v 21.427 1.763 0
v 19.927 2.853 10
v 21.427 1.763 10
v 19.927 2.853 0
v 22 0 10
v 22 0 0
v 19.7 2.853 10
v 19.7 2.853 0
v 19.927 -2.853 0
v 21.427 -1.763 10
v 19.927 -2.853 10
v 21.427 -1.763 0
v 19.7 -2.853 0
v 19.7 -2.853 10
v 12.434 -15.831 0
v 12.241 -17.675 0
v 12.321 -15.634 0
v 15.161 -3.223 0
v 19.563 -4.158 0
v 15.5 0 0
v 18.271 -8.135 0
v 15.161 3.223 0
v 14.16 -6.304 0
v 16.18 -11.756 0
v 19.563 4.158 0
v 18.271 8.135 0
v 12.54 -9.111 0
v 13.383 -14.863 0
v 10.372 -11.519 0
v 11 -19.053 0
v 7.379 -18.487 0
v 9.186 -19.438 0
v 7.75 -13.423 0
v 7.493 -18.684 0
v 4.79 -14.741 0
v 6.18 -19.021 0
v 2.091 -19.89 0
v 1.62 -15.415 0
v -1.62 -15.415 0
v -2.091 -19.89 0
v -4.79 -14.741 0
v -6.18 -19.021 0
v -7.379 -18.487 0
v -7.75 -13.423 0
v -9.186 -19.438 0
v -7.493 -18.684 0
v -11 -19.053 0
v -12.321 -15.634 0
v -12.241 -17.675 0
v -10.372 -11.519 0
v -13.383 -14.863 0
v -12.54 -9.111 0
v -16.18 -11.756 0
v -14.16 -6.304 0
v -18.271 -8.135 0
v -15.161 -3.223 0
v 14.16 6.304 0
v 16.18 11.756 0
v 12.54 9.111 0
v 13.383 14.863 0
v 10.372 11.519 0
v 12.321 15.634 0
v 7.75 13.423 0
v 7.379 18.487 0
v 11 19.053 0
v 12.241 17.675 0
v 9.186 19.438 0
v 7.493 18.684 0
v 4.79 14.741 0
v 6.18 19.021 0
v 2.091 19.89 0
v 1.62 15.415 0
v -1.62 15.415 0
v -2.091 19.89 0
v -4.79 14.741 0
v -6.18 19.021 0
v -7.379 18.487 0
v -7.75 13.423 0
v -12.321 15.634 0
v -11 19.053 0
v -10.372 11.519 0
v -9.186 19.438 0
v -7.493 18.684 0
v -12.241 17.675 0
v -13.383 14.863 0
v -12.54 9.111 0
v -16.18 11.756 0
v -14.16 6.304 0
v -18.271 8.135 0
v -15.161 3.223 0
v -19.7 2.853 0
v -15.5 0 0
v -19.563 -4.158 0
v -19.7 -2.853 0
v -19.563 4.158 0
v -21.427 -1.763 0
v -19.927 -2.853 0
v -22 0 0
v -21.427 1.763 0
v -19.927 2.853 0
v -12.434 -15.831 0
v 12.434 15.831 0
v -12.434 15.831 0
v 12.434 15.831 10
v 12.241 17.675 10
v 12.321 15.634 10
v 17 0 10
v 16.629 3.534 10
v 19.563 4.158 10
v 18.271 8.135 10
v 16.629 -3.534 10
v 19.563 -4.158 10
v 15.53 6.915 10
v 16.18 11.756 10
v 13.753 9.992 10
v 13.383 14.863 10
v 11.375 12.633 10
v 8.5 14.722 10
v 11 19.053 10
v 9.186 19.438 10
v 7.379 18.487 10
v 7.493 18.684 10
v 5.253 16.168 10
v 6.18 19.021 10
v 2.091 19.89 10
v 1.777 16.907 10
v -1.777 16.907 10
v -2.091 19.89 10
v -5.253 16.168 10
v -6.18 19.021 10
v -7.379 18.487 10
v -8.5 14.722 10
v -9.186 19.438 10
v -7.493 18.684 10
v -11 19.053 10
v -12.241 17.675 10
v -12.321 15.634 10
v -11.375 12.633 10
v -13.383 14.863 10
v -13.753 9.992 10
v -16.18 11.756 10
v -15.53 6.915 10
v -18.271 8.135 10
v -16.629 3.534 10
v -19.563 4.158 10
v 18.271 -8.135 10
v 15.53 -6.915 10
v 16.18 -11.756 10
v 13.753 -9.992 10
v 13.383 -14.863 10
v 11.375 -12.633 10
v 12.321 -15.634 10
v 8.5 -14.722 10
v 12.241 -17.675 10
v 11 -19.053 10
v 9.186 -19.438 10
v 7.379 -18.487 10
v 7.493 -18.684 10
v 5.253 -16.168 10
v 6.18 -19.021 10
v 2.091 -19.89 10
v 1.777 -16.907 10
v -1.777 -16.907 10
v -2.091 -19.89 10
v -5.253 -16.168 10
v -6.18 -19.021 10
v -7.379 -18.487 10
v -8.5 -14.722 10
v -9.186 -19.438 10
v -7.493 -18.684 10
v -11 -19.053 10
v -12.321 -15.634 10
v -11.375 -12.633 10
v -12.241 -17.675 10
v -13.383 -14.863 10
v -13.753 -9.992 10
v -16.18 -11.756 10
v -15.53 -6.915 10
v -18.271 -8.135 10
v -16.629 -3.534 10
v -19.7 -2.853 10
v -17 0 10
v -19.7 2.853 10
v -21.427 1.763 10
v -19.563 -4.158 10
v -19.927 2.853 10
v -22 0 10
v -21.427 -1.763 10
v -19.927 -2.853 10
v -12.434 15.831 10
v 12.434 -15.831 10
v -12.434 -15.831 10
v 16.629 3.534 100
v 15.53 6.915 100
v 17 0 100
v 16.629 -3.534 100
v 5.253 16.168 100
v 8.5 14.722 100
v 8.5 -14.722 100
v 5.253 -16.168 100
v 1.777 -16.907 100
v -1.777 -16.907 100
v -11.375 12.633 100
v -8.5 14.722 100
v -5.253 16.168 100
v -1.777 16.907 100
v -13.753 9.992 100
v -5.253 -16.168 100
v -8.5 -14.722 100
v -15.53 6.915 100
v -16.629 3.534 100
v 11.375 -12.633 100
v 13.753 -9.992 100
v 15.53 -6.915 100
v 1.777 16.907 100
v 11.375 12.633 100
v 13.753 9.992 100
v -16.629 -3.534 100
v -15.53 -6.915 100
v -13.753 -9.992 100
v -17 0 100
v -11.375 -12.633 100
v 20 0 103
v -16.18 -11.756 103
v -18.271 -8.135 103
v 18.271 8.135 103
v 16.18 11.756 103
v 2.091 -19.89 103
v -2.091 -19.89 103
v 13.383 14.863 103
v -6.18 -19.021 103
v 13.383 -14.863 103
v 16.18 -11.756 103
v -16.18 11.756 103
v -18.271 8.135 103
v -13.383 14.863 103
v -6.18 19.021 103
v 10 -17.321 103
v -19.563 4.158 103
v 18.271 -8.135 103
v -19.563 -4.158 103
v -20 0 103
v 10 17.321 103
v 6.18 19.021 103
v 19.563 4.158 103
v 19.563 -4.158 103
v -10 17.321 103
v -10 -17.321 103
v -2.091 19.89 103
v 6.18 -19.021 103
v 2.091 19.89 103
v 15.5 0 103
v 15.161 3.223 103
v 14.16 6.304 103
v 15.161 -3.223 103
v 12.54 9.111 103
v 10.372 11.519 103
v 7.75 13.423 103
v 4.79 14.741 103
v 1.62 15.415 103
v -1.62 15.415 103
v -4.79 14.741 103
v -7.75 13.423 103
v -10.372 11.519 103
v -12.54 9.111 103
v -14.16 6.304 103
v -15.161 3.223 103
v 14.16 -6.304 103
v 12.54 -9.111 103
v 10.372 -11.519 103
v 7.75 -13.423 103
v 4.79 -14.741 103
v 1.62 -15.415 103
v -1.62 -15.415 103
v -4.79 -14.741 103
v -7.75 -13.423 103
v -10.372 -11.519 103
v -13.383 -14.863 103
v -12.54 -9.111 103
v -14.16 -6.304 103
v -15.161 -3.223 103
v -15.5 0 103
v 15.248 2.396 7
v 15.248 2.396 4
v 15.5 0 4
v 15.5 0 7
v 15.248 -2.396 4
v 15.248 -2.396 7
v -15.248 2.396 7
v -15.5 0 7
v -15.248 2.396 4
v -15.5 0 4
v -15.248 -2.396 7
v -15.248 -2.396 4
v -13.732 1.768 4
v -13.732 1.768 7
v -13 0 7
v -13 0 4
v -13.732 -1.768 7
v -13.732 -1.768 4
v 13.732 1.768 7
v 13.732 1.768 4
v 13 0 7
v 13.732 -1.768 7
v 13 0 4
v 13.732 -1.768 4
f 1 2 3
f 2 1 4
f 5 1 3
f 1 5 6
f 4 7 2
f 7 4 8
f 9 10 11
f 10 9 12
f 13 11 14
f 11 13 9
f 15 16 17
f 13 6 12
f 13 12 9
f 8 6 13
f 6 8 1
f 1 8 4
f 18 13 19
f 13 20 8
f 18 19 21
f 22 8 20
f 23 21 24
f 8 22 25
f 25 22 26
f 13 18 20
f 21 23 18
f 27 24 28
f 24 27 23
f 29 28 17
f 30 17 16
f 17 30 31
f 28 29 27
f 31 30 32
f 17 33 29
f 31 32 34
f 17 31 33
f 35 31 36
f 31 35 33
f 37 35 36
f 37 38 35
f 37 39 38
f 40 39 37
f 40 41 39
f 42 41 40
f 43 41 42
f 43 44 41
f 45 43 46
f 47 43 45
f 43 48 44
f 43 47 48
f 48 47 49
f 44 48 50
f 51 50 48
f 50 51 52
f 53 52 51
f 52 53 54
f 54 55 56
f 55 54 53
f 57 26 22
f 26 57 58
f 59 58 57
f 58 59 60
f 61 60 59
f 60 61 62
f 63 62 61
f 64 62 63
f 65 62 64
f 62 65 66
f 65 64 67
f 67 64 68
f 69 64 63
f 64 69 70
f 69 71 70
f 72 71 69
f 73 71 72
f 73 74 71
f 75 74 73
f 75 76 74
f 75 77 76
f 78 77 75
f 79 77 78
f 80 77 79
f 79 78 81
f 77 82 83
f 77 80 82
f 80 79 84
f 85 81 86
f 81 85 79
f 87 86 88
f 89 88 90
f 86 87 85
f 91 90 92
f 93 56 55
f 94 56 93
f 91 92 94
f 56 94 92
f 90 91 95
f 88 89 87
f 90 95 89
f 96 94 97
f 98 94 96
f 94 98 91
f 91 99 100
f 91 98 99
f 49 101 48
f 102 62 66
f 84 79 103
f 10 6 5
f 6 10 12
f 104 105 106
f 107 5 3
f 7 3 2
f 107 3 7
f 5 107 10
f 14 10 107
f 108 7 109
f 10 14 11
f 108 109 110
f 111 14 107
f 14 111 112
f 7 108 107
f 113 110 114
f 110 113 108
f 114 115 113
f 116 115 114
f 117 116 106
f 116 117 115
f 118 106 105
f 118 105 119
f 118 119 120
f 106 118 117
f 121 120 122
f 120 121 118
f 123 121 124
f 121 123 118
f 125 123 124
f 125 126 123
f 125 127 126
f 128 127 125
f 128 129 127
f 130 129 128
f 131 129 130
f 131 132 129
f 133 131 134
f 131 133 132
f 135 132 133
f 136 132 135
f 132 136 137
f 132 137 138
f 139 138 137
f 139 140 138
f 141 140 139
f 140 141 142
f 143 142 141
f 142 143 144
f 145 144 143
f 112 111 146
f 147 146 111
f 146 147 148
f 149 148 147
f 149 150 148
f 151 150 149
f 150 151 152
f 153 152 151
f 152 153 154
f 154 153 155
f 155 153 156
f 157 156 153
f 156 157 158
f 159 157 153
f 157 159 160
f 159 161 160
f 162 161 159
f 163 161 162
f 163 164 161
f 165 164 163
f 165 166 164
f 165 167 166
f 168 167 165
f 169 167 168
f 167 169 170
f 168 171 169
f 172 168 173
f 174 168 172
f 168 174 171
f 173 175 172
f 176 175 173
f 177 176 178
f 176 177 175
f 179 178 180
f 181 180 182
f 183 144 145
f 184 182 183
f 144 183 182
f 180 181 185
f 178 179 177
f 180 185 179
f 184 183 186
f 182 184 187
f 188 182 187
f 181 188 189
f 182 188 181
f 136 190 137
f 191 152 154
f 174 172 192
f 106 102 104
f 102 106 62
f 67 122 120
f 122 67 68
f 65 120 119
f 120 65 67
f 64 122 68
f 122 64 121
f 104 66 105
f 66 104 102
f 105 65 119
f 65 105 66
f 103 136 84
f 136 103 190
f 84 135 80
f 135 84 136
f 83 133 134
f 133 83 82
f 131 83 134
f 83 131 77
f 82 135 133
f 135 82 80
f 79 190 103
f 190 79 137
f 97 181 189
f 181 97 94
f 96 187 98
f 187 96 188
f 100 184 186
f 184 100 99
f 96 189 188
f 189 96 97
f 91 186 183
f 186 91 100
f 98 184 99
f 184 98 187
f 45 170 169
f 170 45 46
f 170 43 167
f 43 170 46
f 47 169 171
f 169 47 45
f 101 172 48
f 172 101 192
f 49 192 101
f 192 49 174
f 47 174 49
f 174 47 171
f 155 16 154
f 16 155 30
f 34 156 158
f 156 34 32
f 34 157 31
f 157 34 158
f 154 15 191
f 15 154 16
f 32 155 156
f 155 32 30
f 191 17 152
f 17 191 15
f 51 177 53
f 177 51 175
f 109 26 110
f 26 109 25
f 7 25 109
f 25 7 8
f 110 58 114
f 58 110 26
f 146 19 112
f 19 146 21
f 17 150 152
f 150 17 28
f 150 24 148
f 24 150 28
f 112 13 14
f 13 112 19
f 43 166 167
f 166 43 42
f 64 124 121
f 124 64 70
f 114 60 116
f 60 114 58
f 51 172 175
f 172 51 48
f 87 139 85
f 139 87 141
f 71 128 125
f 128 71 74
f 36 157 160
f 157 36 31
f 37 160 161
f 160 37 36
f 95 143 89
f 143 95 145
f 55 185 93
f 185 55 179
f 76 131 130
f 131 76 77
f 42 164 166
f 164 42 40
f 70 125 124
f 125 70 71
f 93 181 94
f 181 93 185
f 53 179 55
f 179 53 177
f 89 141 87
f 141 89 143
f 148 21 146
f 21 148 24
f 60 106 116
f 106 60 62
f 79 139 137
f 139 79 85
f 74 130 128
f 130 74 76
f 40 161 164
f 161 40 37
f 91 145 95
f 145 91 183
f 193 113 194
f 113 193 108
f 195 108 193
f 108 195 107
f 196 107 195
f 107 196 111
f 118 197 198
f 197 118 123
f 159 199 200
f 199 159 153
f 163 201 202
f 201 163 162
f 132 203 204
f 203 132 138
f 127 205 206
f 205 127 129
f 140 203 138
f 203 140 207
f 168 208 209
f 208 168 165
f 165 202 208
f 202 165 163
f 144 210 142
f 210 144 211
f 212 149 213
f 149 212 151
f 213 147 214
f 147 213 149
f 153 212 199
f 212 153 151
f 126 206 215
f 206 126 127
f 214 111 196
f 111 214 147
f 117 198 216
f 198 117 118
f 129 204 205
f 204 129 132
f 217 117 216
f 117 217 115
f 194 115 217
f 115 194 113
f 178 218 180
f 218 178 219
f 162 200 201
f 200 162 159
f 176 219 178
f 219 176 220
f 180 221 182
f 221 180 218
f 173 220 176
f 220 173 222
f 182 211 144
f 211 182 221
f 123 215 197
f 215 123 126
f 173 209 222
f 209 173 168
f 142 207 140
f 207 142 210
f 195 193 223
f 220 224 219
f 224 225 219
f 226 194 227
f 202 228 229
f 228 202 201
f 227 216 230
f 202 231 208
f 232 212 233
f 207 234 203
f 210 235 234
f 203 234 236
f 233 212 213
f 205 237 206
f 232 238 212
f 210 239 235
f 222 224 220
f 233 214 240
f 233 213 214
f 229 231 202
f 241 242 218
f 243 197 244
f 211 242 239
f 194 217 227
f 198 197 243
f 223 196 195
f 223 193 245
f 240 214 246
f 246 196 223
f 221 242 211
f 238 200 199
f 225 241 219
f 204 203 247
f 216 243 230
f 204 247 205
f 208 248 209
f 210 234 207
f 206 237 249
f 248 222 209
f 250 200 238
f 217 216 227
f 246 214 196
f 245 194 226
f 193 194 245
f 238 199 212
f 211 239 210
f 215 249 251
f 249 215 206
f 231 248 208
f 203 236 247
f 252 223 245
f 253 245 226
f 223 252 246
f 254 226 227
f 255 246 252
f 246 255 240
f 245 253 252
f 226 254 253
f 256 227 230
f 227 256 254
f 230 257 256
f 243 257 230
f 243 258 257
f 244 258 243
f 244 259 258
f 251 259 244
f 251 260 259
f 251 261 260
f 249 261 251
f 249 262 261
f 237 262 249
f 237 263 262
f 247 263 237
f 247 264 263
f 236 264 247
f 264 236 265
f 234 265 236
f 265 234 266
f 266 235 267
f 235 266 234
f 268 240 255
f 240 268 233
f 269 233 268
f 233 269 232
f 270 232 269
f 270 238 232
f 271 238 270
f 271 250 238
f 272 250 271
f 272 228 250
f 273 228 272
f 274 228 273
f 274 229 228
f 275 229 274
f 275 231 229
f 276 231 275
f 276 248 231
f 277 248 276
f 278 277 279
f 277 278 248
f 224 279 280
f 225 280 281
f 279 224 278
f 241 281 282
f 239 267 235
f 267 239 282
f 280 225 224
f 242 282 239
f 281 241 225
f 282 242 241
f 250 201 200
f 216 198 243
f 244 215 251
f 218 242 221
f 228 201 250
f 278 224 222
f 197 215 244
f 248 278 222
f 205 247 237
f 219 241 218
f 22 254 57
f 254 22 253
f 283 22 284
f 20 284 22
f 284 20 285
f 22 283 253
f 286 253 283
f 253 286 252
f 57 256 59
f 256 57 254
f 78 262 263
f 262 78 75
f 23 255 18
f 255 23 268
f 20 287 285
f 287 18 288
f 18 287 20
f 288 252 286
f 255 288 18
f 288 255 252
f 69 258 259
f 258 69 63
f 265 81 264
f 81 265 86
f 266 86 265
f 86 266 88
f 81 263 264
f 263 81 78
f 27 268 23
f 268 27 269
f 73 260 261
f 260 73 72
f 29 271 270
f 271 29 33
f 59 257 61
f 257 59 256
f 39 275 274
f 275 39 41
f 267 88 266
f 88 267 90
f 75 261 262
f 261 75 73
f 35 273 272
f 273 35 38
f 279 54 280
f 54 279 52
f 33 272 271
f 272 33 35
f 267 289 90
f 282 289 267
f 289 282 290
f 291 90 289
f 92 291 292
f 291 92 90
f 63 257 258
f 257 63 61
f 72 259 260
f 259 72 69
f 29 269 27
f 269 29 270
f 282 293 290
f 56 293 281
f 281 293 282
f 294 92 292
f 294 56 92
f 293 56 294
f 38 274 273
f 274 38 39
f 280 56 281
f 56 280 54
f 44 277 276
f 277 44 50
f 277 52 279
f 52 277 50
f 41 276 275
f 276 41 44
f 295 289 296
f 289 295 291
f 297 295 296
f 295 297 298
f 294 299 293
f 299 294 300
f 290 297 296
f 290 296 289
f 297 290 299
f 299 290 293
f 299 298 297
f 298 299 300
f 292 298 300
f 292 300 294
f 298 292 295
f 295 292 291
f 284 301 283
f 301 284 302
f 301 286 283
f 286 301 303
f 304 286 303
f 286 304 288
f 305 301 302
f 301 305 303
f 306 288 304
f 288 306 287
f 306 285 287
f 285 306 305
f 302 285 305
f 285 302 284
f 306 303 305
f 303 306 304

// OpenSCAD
// A second spool holder for ender 3. This replaces the back piece that tightens
// onto the original spool holder.

// TODO - On mine, it fits slightly loose when printed at 0.2 layer height.
// tab_height might need increasing to fix.

spool_width = 90;
wall_thickness = 1.5;

connector_inner = 15.5;
tab_height = 4; // TODO - test increasing tab_height by 0.2?

difference() {
    union() {
        cylinder(h=10, d=40);
        cylinder(h=10 + spool_width, d=(2 * (connector_inner + wall_thickness)));
        translate([0, 0, (10 + spool_width)]) {
            cylinder(h=3, d1=(2 * (connector_inner + wall_thickness)), d2=((2 * (connector_inner + wall_thickness)) + 6));
        }
        for(i = [0 : 60 : 300]) {
            rotate([0, 0, i]) {
                translate([19, 0, 0]) {
                    cylinder(h=10, r=3);
                }
            }
        }
    }
    translate([0, 0, -1]) {
        cylinder(h=spool_width + 15, d=(2 * connector_inner));
    }
}
for(i = [-1, 1]) {
    translate([connector_inner * i, 0, tab_height]) {
        cylinder(h=3, r=2.5);
    }
}
